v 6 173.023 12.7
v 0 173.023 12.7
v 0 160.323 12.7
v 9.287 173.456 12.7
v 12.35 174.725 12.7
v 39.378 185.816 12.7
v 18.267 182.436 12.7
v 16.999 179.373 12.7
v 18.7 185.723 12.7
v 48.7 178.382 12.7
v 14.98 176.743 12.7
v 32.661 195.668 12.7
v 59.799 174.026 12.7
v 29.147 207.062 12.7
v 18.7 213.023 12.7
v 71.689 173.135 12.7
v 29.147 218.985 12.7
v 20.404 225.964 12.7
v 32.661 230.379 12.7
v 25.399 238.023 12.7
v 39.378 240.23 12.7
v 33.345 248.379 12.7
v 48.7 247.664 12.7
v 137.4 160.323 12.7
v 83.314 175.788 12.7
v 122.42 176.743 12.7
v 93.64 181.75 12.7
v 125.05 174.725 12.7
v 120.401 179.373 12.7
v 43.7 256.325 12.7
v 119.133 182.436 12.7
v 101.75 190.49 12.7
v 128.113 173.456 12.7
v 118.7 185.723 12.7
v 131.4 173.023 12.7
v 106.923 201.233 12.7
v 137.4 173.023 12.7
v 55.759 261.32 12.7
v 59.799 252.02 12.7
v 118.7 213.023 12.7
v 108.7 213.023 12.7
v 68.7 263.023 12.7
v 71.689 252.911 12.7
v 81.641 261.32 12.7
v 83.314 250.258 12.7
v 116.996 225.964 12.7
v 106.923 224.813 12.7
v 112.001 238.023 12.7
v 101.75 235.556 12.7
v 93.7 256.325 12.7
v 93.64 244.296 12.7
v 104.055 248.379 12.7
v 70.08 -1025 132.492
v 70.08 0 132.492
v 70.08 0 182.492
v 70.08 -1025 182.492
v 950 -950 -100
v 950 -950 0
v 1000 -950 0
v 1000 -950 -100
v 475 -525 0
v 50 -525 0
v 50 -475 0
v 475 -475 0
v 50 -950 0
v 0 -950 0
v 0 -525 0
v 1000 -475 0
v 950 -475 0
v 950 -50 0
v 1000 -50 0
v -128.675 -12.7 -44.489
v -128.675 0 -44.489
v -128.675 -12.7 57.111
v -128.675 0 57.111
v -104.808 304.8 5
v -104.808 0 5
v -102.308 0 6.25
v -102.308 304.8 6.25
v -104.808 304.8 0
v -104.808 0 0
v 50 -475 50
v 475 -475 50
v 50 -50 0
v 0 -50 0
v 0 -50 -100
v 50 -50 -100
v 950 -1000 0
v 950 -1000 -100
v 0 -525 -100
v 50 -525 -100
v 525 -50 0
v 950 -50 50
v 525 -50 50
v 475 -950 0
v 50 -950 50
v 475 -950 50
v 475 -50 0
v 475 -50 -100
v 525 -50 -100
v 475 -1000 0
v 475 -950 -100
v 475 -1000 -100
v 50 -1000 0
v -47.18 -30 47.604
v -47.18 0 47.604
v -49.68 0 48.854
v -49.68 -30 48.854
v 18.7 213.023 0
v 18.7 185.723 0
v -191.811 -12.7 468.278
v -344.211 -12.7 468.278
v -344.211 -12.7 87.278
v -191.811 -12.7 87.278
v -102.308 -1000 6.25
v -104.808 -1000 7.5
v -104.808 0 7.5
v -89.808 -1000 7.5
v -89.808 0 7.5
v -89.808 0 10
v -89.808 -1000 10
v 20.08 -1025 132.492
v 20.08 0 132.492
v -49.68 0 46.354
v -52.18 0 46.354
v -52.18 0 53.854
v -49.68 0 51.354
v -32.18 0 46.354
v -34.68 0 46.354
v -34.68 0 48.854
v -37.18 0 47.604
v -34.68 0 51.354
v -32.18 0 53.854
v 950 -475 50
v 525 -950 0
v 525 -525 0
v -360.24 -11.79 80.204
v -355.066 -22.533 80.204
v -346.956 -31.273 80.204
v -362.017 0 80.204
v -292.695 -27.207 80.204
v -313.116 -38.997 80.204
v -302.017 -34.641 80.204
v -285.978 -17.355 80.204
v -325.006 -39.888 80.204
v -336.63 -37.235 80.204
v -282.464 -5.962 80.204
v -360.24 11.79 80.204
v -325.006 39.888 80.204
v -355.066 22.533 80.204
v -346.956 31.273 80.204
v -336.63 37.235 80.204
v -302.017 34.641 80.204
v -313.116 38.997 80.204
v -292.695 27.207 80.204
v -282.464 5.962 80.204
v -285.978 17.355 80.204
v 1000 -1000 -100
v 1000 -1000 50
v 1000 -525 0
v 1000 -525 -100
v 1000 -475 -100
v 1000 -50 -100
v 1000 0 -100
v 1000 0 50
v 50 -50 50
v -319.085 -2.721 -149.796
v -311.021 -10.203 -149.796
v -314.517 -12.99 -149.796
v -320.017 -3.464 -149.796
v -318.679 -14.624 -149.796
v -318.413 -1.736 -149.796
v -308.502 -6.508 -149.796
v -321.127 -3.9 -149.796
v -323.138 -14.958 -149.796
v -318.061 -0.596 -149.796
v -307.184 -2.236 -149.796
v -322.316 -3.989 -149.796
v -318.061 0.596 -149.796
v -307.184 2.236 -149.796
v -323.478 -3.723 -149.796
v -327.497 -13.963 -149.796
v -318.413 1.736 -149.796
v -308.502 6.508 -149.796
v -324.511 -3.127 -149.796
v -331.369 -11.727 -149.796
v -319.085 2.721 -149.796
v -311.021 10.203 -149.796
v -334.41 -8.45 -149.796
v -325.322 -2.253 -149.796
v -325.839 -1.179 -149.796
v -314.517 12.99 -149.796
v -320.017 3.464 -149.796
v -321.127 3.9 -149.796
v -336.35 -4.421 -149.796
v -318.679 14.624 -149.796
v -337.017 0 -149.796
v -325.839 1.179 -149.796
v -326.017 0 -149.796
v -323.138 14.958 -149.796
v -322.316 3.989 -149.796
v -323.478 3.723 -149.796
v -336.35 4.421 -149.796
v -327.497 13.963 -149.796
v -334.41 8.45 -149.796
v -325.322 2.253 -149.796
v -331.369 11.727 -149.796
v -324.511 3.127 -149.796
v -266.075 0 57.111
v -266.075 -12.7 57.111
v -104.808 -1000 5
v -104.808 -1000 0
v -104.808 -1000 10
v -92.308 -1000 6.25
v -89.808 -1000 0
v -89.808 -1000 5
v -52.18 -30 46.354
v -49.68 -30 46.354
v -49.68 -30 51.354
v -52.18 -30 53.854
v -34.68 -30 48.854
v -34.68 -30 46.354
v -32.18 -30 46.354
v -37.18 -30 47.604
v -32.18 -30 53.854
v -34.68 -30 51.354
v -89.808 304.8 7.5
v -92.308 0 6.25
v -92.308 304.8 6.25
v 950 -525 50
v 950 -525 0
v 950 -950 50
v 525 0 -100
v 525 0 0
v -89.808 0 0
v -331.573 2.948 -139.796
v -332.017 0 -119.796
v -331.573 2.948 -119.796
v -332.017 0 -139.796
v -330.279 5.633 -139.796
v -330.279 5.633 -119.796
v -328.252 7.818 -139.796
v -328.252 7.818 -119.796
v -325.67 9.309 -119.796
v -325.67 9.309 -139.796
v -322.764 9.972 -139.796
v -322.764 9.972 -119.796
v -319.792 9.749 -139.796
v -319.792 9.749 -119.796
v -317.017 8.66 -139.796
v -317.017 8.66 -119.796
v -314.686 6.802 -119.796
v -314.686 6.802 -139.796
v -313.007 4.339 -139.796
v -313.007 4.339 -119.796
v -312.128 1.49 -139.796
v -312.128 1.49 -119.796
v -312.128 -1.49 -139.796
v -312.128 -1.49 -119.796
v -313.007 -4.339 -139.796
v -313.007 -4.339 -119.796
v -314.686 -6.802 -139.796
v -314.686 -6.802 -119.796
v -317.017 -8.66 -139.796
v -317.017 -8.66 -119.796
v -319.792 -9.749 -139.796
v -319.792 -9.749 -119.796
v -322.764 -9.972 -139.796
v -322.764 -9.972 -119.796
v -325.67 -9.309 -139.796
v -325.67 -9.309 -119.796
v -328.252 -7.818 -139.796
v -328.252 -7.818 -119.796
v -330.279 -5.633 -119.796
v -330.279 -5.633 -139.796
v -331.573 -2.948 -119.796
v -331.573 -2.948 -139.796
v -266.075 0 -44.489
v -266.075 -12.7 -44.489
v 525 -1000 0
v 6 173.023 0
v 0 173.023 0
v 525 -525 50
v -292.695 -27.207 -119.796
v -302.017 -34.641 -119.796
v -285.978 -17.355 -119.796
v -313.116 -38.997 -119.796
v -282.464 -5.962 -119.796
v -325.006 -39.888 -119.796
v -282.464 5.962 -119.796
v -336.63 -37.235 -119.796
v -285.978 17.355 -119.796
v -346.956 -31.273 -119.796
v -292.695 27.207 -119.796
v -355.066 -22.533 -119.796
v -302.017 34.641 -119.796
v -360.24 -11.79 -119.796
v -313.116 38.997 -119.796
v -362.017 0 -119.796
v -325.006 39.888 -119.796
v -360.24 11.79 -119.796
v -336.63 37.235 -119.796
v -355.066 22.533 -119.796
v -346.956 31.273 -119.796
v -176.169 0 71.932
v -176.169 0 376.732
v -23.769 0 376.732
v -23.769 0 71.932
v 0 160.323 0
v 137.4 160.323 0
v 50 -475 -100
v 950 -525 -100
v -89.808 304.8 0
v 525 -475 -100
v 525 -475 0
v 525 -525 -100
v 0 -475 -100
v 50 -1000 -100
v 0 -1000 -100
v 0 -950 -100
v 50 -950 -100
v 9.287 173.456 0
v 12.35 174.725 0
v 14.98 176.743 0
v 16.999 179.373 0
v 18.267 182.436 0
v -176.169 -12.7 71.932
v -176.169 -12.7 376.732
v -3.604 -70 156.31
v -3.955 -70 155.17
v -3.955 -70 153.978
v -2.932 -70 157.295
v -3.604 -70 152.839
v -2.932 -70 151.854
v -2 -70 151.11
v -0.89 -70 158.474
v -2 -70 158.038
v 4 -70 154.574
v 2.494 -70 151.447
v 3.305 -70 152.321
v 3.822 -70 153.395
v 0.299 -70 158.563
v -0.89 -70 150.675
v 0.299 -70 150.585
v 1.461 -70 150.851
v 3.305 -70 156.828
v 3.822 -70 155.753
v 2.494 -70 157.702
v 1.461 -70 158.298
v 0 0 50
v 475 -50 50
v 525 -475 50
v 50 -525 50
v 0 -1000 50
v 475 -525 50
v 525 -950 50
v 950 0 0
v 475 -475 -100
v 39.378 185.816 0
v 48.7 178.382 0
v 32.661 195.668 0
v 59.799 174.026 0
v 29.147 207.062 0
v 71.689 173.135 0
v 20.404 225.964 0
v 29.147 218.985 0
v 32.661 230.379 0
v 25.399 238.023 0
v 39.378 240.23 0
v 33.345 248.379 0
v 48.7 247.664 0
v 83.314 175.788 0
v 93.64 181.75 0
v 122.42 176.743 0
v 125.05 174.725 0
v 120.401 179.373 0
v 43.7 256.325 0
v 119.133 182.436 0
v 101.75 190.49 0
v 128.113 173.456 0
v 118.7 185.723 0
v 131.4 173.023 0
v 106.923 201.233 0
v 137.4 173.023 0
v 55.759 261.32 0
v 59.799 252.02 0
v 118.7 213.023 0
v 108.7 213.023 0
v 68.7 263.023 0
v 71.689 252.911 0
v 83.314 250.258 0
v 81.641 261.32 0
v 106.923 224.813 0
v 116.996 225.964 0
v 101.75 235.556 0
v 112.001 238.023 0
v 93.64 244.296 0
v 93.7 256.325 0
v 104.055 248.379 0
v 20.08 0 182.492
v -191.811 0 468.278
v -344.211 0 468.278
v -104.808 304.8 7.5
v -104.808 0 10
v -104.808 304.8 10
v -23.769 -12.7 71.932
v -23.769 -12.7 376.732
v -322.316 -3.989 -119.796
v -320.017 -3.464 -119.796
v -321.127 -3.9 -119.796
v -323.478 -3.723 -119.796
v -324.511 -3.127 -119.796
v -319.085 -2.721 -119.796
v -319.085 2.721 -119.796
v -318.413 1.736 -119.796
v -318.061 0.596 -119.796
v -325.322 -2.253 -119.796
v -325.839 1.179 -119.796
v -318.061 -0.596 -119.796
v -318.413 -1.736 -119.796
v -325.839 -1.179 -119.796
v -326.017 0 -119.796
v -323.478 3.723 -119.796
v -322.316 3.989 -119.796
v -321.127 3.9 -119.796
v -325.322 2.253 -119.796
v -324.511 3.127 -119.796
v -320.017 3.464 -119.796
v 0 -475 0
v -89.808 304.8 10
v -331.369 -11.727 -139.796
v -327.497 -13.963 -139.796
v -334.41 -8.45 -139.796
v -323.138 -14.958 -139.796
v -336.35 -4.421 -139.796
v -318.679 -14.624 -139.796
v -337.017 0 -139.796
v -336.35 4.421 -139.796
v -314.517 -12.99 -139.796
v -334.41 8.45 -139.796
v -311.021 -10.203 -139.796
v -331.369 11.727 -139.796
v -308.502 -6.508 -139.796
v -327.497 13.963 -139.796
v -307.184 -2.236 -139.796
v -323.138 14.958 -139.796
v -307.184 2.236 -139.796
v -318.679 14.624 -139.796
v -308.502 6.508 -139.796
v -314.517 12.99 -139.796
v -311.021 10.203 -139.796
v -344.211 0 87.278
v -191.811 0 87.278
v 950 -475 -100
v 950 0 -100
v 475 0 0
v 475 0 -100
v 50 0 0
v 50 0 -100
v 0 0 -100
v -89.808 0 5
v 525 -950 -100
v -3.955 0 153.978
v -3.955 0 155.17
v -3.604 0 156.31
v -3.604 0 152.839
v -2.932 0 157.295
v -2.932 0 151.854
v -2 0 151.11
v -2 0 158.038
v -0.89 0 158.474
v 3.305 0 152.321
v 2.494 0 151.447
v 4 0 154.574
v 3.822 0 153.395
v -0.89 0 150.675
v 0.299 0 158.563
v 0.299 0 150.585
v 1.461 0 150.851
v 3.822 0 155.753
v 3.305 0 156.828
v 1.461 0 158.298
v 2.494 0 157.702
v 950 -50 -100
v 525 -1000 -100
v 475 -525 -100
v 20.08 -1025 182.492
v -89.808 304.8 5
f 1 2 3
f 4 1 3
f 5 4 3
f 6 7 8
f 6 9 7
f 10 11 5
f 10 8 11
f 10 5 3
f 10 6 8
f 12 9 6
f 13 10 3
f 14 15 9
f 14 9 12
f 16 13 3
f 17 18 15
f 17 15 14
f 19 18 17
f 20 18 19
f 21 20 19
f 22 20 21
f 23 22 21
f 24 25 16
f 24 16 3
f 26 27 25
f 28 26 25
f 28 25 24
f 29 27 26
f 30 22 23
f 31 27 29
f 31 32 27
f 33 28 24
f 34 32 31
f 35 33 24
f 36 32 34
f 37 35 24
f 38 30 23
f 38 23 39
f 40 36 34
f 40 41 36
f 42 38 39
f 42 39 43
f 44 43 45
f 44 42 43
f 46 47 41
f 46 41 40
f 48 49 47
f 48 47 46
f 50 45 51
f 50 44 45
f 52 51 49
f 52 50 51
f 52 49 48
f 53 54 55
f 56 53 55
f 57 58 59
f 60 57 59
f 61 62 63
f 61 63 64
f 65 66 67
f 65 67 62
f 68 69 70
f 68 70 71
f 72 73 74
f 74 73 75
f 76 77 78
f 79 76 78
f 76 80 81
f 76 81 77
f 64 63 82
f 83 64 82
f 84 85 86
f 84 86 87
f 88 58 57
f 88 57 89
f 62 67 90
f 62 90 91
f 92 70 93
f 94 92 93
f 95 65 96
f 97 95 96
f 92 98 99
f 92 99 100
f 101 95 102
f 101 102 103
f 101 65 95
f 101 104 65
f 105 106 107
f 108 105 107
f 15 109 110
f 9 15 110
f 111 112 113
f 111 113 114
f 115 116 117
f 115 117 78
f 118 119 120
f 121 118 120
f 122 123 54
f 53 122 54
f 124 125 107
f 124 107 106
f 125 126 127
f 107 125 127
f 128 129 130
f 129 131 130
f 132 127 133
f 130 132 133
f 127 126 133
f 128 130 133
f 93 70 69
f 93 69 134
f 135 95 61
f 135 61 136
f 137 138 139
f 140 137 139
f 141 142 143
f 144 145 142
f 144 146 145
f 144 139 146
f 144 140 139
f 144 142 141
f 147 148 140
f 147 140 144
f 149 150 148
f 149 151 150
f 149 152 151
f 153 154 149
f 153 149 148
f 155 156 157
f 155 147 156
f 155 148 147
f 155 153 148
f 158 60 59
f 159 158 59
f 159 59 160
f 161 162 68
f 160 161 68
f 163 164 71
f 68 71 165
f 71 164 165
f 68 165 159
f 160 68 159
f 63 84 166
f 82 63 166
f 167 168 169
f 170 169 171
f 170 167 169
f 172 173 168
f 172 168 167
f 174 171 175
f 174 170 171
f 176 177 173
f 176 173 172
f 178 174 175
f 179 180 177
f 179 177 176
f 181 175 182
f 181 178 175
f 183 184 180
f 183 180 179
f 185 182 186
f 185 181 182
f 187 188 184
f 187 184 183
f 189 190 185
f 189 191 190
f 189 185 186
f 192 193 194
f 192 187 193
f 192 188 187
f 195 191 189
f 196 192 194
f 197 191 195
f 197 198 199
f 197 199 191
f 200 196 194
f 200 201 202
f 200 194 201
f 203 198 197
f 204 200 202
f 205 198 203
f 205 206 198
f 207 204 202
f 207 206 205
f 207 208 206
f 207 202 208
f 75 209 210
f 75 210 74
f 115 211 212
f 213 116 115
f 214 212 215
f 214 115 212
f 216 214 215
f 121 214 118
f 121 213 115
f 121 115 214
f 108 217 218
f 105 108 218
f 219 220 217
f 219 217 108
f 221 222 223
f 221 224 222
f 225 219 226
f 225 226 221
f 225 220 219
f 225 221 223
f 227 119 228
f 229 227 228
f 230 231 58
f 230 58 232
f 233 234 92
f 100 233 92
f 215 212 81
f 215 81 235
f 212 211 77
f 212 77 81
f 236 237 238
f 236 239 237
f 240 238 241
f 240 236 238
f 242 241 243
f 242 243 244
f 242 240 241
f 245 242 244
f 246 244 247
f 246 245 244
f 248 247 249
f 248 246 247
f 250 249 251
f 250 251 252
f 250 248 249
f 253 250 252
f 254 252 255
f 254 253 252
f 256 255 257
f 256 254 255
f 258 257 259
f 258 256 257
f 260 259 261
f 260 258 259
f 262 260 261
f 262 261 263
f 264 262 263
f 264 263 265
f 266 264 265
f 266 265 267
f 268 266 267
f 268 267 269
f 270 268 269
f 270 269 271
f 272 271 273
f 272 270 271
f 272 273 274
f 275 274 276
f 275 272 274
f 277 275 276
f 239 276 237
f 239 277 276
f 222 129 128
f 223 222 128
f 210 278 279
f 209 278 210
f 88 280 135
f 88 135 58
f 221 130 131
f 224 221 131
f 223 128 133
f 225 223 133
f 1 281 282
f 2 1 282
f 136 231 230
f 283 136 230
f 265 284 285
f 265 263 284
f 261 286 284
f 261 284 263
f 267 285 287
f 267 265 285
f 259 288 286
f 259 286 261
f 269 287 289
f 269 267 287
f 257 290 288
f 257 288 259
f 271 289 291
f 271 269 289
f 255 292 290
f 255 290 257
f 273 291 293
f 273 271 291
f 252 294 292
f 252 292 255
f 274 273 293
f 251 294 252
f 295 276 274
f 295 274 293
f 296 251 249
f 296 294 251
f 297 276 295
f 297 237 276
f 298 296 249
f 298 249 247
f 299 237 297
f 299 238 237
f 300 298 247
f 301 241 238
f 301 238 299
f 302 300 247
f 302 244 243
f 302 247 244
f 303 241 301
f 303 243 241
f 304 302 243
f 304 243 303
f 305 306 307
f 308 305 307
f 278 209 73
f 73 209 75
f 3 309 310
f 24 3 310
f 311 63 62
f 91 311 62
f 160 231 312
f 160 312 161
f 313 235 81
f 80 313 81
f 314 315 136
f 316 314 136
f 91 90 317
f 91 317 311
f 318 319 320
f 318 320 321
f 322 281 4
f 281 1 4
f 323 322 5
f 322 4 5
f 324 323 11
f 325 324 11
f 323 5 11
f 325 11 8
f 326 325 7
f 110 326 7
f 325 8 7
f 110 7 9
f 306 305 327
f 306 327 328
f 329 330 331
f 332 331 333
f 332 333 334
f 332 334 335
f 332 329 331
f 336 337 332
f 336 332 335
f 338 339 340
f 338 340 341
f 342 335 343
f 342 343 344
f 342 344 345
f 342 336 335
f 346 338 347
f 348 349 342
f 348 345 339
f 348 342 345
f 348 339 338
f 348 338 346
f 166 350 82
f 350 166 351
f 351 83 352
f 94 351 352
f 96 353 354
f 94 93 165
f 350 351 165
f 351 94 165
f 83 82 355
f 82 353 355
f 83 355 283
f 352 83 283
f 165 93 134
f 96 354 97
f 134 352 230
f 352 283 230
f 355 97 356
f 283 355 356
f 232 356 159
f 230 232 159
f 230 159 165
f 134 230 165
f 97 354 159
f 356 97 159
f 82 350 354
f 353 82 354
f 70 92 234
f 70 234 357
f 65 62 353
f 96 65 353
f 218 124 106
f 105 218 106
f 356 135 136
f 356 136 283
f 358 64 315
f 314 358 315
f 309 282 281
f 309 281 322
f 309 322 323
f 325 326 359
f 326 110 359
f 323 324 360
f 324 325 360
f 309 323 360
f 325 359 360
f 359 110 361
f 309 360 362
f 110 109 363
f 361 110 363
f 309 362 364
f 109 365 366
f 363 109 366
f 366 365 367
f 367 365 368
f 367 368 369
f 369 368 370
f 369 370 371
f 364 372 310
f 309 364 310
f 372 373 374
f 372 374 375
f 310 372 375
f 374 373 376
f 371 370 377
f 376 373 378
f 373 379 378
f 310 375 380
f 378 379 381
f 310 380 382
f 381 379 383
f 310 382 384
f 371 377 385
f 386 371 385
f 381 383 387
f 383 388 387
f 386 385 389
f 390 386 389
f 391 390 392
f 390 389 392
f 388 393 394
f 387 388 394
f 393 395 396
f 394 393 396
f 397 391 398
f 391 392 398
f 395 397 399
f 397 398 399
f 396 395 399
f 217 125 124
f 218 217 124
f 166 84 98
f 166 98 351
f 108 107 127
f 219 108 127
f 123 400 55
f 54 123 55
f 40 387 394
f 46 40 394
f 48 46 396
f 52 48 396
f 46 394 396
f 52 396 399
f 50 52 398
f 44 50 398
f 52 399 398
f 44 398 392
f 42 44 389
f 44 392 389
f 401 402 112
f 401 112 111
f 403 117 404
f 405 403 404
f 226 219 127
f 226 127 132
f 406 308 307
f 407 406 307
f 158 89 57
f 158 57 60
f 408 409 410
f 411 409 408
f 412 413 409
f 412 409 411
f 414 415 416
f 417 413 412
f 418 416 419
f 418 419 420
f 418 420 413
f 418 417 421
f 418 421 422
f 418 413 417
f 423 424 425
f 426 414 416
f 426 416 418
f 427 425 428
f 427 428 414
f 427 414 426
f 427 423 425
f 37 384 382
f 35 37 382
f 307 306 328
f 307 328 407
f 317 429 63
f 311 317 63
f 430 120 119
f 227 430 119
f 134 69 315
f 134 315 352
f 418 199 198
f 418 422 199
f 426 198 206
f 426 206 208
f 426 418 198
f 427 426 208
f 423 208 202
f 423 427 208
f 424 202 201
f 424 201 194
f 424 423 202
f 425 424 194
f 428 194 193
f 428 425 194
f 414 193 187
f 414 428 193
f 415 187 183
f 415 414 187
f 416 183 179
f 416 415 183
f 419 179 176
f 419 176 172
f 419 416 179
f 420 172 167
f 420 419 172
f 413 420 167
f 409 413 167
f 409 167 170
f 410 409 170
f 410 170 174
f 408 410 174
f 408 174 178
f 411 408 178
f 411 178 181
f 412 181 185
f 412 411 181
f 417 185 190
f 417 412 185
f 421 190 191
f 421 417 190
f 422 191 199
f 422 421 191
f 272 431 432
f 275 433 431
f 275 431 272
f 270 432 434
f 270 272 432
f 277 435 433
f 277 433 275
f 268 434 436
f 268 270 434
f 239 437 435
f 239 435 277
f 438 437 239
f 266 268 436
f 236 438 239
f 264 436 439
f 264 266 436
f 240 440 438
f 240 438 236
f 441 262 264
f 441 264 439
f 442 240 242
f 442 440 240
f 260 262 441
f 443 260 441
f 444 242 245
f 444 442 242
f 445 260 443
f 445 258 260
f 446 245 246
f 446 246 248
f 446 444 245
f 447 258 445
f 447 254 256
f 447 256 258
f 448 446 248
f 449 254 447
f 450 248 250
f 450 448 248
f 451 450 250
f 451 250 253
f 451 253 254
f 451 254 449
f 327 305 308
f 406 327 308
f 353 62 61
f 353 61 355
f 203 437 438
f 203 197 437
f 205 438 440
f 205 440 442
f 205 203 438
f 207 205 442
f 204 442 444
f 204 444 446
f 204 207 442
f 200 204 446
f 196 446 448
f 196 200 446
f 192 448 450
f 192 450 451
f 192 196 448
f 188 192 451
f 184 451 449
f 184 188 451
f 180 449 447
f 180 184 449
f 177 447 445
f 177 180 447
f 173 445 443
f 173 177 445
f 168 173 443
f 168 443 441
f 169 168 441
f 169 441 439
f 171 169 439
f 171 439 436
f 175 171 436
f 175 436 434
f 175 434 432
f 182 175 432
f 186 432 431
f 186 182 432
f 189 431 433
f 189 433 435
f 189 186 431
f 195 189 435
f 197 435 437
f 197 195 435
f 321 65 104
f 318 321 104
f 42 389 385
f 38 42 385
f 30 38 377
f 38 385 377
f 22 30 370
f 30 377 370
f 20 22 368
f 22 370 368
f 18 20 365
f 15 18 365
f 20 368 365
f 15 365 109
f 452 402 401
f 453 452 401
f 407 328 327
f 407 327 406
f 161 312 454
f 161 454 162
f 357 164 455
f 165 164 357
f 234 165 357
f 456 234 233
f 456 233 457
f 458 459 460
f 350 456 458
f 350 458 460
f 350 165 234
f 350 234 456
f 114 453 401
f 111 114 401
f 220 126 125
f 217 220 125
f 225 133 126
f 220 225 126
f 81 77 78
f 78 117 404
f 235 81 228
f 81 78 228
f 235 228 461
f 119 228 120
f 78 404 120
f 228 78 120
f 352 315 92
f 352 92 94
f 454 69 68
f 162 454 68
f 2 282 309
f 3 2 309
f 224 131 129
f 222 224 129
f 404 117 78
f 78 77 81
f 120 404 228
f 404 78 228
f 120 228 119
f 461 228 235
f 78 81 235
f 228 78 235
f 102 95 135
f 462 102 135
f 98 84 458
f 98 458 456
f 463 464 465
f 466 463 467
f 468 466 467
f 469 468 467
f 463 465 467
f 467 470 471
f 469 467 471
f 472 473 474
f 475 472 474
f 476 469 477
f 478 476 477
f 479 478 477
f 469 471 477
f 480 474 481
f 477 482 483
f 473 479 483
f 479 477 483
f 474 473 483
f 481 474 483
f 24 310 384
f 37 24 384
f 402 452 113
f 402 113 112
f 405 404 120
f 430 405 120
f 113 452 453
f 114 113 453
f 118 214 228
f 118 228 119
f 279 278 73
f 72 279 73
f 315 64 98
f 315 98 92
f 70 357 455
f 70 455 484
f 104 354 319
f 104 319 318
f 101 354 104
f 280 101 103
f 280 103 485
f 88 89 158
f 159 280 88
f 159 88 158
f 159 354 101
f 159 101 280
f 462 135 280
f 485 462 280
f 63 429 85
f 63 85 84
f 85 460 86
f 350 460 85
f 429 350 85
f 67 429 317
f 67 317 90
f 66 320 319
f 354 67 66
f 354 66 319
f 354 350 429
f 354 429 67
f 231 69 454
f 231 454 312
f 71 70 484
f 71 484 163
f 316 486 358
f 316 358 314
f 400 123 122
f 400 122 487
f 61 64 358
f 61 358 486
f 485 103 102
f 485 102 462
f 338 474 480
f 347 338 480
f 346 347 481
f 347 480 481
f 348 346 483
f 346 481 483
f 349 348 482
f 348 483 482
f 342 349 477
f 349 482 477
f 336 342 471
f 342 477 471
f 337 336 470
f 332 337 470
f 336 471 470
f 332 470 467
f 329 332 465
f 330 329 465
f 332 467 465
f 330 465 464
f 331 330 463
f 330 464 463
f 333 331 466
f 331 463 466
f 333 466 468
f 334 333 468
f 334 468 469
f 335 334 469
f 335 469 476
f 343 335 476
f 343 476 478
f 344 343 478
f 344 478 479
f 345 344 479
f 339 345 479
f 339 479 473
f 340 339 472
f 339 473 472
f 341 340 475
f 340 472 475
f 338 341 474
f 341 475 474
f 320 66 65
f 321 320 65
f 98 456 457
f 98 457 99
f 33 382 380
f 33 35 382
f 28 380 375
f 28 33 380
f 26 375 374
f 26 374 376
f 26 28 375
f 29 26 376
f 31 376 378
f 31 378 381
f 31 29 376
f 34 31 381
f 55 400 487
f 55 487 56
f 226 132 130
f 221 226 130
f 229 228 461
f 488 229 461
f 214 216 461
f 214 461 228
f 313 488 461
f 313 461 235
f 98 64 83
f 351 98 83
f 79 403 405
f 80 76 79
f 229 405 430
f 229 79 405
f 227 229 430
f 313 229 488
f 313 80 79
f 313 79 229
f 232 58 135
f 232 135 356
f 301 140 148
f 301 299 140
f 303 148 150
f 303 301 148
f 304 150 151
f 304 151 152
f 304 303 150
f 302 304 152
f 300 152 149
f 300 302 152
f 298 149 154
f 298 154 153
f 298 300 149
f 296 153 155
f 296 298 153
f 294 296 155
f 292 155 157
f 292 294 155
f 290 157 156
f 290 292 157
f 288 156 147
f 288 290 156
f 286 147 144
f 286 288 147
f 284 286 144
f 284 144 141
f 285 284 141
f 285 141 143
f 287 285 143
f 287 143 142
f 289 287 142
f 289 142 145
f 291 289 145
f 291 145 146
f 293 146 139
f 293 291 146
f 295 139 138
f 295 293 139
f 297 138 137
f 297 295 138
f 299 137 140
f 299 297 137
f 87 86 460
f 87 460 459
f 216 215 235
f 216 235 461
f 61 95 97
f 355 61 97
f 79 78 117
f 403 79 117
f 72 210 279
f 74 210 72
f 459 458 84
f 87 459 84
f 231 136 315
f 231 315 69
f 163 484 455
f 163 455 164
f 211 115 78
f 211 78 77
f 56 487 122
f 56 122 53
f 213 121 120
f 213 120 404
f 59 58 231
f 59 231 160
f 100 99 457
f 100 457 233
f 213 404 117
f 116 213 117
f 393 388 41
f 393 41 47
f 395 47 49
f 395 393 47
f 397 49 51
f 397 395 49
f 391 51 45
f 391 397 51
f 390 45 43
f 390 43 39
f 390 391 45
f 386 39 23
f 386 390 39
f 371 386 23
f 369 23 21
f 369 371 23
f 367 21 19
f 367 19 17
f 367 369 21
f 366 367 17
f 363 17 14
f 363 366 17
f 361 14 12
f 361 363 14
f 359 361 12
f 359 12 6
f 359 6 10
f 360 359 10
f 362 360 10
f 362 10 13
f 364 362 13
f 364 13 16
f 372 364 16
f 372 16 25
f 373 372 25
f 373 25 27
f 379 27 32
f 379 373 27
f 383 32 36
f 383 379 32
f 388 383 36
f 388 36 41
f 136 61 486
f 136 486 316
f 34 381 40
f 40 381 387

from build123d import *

# Parameters (mm, degrees)
F0_W      = 50
F0_H      = 50
F1_DEPTH  = 1000
F2_W      = 50
F2_H      = 50
F3_DEPTH  = 450
F4_W      = 25
F4_H      = 50
F5_DEPTH  = 900
F7_W      = 50
F7_H      = 50
F8_DEPTH  = 100
F10_DEPTH = 1000
F11_W     = 152.4
F11_H     = 381
F12_DEPTH = 12.7
F14_DEPTH = 30
F15_W     = 50
F15_H     = 50
F16_DEPTH = 1025
F17_W     = 152.4
F17_H     = 304.8
F18_DEPTH = 12.7
F19_DEPTH = 304.8
F20_W     = 137.4
F20_H     = 101.6
F21_DEPTH = 12.7
F22_R     = 40
F23_DEPTH = 12.7
F24_R     = 12.7
F27_R     = 4
F28_DEPTH = 70


with BuildPart() as f1:
    # F0 (on Front) → F1 (new body)
    with BuildSketch(Plane.XZ):
        with Locations((25, 25)):
            Rectangle(F0_W, F0_H)
    extrude(amount=F1_DEPTH)

    # F2 (on face) → F3 (join)
    with BuildSketch(Plane.YZ.offset(50)):
        with Locations((-500, 25)):
            Rectangle(F2_W, F2_H)
        with Locations((-975, 25)):
            Rectangle(F2_W, F2_H)
        with Locations((-25, 25)):
            Rectangle(F2_W, F2_H)
    extrude(amount=F3_DEPTH)

    # F4 (on face) → F5 (join)
    with BuildSketch(Plane(origin=(0, -950, 0), x_dir=(-1, 0, 0), z_dir=(0, 1, 0))):
        with Locations((-487.5, 25)):
            Rectangle(F4_W, F4_H)
    extrude(amount=F5_DEPTH)

    # F6: F1 across face


with BuildPart() as f1_1:
    add(f1.part)
    add(f1.part.mirror(Plane(origin=(500, -500, 25), x_dir=(0, 1, 0), z_dir=(1, 0, 0))))

    # F7 (on face) → F8 (join)
    with BuildSketch(Plane(origin=(0, 0, 0), x_dir=(1, 0, 0), z_dir=(0, 0, -1))):
        with Locations((25, 975)):
            Rectangle(F7_W, F7_H)
        with Locations((975, 975)):
            Rectangle(F7_W, F7_H)
        with Locations((975, 25)):
            Rectangle(F7_W, F7_H)
        with Locations((25, 25)):
            Rectangle(F7_W, F7_H)
        with Locations((25, 500)):
            Rectangle(F7_W, F7_H)
        with Locations((975, 500)):
            Rectangle(F7_W, F7_H)
        with Locations((500, 25)):
            Rectangle(F7_W, F7_H)
        with Locations((500, 500)):
            Rectangle(F7_W, F7_H)
        with Locations((500, 975)):
            Rectangle(F7_W, F7_H)
    extrude(amount=F8_DEPTH)


with BuildPart() as f10:
    # F9 (on Front) → F10 (new body)
    with BuildSketch(Plane.XZ):
        Polygon((-104.807849, 5), (-104.807849, 0), (-89.807849, 0), (-89.807849, 5), (-92.307849, 6.25), (-89.807849, 7.5), (-89.807849, 10), (-104.807849, 10), (-104.807849, 7.5), (-102.307849, 6.25), align=None)
    extrude(amount=F10_DEPTH)


with BuildPart() as f12:
    # F11 (on Front) → F12 (new body)
    with BuildSketch(Plane.XZ):
        with Locations((-268.01108, 277.777746)):
            Rectangle(F11_W, F11_H)
    extrude(amount=F12_DEPTH)


with BuildPart() as f14:
    # F13 (on Front) → F14 (new body)
    with BuildSketch(Plane.XZ):
        Polygon((-34.679969, 46.354181), (-32.179969, 46.354181), (-32.179969, 53.854181), (-52.179969, 53.854181), (-52.179969, 46.354181), (-49.679969, 46.354181), (-47.179969, 47.604181), (-49.679969, 48.854181), (-49.679969, 51.354181), (-34.679969, 51.354181), (-34.679969, 48.854181), (-37.179969, 47.604181), align=None)
    extrude(amount=F14_DEPTH)


with BuildPart() as f16:
    # F15 (on Front) → F16 (new body)
    with BuildSketch(Plane.XZ):
        with Locations((45.07963, 157.491842)):
            Rectangle(F15_W, F15_H)
    extrude(amount=F16_DEPTH)


with BuildPart() as f18:
    # F17 (on Front) → F18 (new body)
    with BuildSketch(Plane.XZ):
        with Locations((-99.968564, 224.33223)):
            Rectangle(F17_W, F17_H)
    extrude(amount=F18_DEPTH)


with BuildPart() as f19:
    # F10_face (on face) → F19 (new body)
    with BuildSketch(Plane(origin=(-97.307849, 0, 4.945652), x_dir=(1, 0, 0), z_dir=(0, 1, 0))):
        Polygon((-7.5, 4.945652), (-7.5, -0.054348), (-5, -1.304348), (-7.5, -2.554348), (-7.5, -5.054348), (7.5, -5.054348), (7.5, -2.554348), (5, -1.304348), (7.5, -0.054348), (7.5, 4.945652), align=None)
    extrude(amount=F19_DEPTH)


with BuildPart() as f21:
    # F20 (on Front) → F21 (new body)
    with BuildSketch(Plane.XZ):
        with Locations((-197.374826, 6.310578)):
            Rectangle(F20_W, F20_H)
    extrude(amount=F21_DEPTH)


with BuildPart() as f23:
    # F22 (on Top) → F23 (new body)
    with BuildSketch(Plane.XY):
        with BuildLine():
            Line((0, 173.023237), (0, 160.323237))
            Line((0, 160.323237), (137.4, 160.323237))
            Line((137.4, 160.323237), (137.4, 173.023237))
            Line((137.4, 173.023237), (118.7, 173.023237))
            Line((118.7, 173.023237), (118.7, 213.023237))
            ThreePointArc((118.7, 213.023237), (104.055339, 248.378576), (68.7, 263.023237))
            ThreePointArc((68.7, 263.023237), (33.344661, 248.378576), (18.7, 213.023237))
            Line((18.7, 213.023237), (18.7, 173.023237))
            Line((18.7, 173.023237), (0, 173.023237))
        make_face()
        with Locations((68.7, 213.023237)):
            Circle(F22_R, mode=Mode.SUBTRACT)
    extrude(amount=F23_DEPTH)

    # F24
    f24_edges = [f23.edges().sort_by_distance(p)[0] for p in [
        (118.7, 173.023237, 6.35),
        (18.7, 173.023237, 6.35),
    ]]
    fillet(f24_edges, radius=F24_R)


with BuildPart() as f26:
    # F25 (on Front) → F26 (revolve)
    with BuildSketch(Plane.XZ):
        Polygon((-337.016799, -149.796396), (-326.016799, -149.796396), (-326.016799, -119.796396), (-322.016799, -119.796396), (-322.016799, 80.203604), (-362.016799, 80.203604), (-362.016799, -119.796396), (-332.016799, -119.796396), (-332.016799, -139.796396), (-337.016799, -139.796396), align=None)
    revolve(axis=Axis((-322.016799, 0, -19.796396), (0, 0, -1)))


with BuildPart() as f28:
    # F27 (on Front) → F28 (new body)
    with BuildSketch(Plane.XZ):
        with Locations((0, 154.57424)):
            Circle(F27_R)
    extrude(amount=F28_DEPTH)


solid = Compound([f1_1.part, f10.part, f12.part, f14.part, f16.part, f18.part, f19.part, f21.part, f23.part, f26.part, f28.part])
